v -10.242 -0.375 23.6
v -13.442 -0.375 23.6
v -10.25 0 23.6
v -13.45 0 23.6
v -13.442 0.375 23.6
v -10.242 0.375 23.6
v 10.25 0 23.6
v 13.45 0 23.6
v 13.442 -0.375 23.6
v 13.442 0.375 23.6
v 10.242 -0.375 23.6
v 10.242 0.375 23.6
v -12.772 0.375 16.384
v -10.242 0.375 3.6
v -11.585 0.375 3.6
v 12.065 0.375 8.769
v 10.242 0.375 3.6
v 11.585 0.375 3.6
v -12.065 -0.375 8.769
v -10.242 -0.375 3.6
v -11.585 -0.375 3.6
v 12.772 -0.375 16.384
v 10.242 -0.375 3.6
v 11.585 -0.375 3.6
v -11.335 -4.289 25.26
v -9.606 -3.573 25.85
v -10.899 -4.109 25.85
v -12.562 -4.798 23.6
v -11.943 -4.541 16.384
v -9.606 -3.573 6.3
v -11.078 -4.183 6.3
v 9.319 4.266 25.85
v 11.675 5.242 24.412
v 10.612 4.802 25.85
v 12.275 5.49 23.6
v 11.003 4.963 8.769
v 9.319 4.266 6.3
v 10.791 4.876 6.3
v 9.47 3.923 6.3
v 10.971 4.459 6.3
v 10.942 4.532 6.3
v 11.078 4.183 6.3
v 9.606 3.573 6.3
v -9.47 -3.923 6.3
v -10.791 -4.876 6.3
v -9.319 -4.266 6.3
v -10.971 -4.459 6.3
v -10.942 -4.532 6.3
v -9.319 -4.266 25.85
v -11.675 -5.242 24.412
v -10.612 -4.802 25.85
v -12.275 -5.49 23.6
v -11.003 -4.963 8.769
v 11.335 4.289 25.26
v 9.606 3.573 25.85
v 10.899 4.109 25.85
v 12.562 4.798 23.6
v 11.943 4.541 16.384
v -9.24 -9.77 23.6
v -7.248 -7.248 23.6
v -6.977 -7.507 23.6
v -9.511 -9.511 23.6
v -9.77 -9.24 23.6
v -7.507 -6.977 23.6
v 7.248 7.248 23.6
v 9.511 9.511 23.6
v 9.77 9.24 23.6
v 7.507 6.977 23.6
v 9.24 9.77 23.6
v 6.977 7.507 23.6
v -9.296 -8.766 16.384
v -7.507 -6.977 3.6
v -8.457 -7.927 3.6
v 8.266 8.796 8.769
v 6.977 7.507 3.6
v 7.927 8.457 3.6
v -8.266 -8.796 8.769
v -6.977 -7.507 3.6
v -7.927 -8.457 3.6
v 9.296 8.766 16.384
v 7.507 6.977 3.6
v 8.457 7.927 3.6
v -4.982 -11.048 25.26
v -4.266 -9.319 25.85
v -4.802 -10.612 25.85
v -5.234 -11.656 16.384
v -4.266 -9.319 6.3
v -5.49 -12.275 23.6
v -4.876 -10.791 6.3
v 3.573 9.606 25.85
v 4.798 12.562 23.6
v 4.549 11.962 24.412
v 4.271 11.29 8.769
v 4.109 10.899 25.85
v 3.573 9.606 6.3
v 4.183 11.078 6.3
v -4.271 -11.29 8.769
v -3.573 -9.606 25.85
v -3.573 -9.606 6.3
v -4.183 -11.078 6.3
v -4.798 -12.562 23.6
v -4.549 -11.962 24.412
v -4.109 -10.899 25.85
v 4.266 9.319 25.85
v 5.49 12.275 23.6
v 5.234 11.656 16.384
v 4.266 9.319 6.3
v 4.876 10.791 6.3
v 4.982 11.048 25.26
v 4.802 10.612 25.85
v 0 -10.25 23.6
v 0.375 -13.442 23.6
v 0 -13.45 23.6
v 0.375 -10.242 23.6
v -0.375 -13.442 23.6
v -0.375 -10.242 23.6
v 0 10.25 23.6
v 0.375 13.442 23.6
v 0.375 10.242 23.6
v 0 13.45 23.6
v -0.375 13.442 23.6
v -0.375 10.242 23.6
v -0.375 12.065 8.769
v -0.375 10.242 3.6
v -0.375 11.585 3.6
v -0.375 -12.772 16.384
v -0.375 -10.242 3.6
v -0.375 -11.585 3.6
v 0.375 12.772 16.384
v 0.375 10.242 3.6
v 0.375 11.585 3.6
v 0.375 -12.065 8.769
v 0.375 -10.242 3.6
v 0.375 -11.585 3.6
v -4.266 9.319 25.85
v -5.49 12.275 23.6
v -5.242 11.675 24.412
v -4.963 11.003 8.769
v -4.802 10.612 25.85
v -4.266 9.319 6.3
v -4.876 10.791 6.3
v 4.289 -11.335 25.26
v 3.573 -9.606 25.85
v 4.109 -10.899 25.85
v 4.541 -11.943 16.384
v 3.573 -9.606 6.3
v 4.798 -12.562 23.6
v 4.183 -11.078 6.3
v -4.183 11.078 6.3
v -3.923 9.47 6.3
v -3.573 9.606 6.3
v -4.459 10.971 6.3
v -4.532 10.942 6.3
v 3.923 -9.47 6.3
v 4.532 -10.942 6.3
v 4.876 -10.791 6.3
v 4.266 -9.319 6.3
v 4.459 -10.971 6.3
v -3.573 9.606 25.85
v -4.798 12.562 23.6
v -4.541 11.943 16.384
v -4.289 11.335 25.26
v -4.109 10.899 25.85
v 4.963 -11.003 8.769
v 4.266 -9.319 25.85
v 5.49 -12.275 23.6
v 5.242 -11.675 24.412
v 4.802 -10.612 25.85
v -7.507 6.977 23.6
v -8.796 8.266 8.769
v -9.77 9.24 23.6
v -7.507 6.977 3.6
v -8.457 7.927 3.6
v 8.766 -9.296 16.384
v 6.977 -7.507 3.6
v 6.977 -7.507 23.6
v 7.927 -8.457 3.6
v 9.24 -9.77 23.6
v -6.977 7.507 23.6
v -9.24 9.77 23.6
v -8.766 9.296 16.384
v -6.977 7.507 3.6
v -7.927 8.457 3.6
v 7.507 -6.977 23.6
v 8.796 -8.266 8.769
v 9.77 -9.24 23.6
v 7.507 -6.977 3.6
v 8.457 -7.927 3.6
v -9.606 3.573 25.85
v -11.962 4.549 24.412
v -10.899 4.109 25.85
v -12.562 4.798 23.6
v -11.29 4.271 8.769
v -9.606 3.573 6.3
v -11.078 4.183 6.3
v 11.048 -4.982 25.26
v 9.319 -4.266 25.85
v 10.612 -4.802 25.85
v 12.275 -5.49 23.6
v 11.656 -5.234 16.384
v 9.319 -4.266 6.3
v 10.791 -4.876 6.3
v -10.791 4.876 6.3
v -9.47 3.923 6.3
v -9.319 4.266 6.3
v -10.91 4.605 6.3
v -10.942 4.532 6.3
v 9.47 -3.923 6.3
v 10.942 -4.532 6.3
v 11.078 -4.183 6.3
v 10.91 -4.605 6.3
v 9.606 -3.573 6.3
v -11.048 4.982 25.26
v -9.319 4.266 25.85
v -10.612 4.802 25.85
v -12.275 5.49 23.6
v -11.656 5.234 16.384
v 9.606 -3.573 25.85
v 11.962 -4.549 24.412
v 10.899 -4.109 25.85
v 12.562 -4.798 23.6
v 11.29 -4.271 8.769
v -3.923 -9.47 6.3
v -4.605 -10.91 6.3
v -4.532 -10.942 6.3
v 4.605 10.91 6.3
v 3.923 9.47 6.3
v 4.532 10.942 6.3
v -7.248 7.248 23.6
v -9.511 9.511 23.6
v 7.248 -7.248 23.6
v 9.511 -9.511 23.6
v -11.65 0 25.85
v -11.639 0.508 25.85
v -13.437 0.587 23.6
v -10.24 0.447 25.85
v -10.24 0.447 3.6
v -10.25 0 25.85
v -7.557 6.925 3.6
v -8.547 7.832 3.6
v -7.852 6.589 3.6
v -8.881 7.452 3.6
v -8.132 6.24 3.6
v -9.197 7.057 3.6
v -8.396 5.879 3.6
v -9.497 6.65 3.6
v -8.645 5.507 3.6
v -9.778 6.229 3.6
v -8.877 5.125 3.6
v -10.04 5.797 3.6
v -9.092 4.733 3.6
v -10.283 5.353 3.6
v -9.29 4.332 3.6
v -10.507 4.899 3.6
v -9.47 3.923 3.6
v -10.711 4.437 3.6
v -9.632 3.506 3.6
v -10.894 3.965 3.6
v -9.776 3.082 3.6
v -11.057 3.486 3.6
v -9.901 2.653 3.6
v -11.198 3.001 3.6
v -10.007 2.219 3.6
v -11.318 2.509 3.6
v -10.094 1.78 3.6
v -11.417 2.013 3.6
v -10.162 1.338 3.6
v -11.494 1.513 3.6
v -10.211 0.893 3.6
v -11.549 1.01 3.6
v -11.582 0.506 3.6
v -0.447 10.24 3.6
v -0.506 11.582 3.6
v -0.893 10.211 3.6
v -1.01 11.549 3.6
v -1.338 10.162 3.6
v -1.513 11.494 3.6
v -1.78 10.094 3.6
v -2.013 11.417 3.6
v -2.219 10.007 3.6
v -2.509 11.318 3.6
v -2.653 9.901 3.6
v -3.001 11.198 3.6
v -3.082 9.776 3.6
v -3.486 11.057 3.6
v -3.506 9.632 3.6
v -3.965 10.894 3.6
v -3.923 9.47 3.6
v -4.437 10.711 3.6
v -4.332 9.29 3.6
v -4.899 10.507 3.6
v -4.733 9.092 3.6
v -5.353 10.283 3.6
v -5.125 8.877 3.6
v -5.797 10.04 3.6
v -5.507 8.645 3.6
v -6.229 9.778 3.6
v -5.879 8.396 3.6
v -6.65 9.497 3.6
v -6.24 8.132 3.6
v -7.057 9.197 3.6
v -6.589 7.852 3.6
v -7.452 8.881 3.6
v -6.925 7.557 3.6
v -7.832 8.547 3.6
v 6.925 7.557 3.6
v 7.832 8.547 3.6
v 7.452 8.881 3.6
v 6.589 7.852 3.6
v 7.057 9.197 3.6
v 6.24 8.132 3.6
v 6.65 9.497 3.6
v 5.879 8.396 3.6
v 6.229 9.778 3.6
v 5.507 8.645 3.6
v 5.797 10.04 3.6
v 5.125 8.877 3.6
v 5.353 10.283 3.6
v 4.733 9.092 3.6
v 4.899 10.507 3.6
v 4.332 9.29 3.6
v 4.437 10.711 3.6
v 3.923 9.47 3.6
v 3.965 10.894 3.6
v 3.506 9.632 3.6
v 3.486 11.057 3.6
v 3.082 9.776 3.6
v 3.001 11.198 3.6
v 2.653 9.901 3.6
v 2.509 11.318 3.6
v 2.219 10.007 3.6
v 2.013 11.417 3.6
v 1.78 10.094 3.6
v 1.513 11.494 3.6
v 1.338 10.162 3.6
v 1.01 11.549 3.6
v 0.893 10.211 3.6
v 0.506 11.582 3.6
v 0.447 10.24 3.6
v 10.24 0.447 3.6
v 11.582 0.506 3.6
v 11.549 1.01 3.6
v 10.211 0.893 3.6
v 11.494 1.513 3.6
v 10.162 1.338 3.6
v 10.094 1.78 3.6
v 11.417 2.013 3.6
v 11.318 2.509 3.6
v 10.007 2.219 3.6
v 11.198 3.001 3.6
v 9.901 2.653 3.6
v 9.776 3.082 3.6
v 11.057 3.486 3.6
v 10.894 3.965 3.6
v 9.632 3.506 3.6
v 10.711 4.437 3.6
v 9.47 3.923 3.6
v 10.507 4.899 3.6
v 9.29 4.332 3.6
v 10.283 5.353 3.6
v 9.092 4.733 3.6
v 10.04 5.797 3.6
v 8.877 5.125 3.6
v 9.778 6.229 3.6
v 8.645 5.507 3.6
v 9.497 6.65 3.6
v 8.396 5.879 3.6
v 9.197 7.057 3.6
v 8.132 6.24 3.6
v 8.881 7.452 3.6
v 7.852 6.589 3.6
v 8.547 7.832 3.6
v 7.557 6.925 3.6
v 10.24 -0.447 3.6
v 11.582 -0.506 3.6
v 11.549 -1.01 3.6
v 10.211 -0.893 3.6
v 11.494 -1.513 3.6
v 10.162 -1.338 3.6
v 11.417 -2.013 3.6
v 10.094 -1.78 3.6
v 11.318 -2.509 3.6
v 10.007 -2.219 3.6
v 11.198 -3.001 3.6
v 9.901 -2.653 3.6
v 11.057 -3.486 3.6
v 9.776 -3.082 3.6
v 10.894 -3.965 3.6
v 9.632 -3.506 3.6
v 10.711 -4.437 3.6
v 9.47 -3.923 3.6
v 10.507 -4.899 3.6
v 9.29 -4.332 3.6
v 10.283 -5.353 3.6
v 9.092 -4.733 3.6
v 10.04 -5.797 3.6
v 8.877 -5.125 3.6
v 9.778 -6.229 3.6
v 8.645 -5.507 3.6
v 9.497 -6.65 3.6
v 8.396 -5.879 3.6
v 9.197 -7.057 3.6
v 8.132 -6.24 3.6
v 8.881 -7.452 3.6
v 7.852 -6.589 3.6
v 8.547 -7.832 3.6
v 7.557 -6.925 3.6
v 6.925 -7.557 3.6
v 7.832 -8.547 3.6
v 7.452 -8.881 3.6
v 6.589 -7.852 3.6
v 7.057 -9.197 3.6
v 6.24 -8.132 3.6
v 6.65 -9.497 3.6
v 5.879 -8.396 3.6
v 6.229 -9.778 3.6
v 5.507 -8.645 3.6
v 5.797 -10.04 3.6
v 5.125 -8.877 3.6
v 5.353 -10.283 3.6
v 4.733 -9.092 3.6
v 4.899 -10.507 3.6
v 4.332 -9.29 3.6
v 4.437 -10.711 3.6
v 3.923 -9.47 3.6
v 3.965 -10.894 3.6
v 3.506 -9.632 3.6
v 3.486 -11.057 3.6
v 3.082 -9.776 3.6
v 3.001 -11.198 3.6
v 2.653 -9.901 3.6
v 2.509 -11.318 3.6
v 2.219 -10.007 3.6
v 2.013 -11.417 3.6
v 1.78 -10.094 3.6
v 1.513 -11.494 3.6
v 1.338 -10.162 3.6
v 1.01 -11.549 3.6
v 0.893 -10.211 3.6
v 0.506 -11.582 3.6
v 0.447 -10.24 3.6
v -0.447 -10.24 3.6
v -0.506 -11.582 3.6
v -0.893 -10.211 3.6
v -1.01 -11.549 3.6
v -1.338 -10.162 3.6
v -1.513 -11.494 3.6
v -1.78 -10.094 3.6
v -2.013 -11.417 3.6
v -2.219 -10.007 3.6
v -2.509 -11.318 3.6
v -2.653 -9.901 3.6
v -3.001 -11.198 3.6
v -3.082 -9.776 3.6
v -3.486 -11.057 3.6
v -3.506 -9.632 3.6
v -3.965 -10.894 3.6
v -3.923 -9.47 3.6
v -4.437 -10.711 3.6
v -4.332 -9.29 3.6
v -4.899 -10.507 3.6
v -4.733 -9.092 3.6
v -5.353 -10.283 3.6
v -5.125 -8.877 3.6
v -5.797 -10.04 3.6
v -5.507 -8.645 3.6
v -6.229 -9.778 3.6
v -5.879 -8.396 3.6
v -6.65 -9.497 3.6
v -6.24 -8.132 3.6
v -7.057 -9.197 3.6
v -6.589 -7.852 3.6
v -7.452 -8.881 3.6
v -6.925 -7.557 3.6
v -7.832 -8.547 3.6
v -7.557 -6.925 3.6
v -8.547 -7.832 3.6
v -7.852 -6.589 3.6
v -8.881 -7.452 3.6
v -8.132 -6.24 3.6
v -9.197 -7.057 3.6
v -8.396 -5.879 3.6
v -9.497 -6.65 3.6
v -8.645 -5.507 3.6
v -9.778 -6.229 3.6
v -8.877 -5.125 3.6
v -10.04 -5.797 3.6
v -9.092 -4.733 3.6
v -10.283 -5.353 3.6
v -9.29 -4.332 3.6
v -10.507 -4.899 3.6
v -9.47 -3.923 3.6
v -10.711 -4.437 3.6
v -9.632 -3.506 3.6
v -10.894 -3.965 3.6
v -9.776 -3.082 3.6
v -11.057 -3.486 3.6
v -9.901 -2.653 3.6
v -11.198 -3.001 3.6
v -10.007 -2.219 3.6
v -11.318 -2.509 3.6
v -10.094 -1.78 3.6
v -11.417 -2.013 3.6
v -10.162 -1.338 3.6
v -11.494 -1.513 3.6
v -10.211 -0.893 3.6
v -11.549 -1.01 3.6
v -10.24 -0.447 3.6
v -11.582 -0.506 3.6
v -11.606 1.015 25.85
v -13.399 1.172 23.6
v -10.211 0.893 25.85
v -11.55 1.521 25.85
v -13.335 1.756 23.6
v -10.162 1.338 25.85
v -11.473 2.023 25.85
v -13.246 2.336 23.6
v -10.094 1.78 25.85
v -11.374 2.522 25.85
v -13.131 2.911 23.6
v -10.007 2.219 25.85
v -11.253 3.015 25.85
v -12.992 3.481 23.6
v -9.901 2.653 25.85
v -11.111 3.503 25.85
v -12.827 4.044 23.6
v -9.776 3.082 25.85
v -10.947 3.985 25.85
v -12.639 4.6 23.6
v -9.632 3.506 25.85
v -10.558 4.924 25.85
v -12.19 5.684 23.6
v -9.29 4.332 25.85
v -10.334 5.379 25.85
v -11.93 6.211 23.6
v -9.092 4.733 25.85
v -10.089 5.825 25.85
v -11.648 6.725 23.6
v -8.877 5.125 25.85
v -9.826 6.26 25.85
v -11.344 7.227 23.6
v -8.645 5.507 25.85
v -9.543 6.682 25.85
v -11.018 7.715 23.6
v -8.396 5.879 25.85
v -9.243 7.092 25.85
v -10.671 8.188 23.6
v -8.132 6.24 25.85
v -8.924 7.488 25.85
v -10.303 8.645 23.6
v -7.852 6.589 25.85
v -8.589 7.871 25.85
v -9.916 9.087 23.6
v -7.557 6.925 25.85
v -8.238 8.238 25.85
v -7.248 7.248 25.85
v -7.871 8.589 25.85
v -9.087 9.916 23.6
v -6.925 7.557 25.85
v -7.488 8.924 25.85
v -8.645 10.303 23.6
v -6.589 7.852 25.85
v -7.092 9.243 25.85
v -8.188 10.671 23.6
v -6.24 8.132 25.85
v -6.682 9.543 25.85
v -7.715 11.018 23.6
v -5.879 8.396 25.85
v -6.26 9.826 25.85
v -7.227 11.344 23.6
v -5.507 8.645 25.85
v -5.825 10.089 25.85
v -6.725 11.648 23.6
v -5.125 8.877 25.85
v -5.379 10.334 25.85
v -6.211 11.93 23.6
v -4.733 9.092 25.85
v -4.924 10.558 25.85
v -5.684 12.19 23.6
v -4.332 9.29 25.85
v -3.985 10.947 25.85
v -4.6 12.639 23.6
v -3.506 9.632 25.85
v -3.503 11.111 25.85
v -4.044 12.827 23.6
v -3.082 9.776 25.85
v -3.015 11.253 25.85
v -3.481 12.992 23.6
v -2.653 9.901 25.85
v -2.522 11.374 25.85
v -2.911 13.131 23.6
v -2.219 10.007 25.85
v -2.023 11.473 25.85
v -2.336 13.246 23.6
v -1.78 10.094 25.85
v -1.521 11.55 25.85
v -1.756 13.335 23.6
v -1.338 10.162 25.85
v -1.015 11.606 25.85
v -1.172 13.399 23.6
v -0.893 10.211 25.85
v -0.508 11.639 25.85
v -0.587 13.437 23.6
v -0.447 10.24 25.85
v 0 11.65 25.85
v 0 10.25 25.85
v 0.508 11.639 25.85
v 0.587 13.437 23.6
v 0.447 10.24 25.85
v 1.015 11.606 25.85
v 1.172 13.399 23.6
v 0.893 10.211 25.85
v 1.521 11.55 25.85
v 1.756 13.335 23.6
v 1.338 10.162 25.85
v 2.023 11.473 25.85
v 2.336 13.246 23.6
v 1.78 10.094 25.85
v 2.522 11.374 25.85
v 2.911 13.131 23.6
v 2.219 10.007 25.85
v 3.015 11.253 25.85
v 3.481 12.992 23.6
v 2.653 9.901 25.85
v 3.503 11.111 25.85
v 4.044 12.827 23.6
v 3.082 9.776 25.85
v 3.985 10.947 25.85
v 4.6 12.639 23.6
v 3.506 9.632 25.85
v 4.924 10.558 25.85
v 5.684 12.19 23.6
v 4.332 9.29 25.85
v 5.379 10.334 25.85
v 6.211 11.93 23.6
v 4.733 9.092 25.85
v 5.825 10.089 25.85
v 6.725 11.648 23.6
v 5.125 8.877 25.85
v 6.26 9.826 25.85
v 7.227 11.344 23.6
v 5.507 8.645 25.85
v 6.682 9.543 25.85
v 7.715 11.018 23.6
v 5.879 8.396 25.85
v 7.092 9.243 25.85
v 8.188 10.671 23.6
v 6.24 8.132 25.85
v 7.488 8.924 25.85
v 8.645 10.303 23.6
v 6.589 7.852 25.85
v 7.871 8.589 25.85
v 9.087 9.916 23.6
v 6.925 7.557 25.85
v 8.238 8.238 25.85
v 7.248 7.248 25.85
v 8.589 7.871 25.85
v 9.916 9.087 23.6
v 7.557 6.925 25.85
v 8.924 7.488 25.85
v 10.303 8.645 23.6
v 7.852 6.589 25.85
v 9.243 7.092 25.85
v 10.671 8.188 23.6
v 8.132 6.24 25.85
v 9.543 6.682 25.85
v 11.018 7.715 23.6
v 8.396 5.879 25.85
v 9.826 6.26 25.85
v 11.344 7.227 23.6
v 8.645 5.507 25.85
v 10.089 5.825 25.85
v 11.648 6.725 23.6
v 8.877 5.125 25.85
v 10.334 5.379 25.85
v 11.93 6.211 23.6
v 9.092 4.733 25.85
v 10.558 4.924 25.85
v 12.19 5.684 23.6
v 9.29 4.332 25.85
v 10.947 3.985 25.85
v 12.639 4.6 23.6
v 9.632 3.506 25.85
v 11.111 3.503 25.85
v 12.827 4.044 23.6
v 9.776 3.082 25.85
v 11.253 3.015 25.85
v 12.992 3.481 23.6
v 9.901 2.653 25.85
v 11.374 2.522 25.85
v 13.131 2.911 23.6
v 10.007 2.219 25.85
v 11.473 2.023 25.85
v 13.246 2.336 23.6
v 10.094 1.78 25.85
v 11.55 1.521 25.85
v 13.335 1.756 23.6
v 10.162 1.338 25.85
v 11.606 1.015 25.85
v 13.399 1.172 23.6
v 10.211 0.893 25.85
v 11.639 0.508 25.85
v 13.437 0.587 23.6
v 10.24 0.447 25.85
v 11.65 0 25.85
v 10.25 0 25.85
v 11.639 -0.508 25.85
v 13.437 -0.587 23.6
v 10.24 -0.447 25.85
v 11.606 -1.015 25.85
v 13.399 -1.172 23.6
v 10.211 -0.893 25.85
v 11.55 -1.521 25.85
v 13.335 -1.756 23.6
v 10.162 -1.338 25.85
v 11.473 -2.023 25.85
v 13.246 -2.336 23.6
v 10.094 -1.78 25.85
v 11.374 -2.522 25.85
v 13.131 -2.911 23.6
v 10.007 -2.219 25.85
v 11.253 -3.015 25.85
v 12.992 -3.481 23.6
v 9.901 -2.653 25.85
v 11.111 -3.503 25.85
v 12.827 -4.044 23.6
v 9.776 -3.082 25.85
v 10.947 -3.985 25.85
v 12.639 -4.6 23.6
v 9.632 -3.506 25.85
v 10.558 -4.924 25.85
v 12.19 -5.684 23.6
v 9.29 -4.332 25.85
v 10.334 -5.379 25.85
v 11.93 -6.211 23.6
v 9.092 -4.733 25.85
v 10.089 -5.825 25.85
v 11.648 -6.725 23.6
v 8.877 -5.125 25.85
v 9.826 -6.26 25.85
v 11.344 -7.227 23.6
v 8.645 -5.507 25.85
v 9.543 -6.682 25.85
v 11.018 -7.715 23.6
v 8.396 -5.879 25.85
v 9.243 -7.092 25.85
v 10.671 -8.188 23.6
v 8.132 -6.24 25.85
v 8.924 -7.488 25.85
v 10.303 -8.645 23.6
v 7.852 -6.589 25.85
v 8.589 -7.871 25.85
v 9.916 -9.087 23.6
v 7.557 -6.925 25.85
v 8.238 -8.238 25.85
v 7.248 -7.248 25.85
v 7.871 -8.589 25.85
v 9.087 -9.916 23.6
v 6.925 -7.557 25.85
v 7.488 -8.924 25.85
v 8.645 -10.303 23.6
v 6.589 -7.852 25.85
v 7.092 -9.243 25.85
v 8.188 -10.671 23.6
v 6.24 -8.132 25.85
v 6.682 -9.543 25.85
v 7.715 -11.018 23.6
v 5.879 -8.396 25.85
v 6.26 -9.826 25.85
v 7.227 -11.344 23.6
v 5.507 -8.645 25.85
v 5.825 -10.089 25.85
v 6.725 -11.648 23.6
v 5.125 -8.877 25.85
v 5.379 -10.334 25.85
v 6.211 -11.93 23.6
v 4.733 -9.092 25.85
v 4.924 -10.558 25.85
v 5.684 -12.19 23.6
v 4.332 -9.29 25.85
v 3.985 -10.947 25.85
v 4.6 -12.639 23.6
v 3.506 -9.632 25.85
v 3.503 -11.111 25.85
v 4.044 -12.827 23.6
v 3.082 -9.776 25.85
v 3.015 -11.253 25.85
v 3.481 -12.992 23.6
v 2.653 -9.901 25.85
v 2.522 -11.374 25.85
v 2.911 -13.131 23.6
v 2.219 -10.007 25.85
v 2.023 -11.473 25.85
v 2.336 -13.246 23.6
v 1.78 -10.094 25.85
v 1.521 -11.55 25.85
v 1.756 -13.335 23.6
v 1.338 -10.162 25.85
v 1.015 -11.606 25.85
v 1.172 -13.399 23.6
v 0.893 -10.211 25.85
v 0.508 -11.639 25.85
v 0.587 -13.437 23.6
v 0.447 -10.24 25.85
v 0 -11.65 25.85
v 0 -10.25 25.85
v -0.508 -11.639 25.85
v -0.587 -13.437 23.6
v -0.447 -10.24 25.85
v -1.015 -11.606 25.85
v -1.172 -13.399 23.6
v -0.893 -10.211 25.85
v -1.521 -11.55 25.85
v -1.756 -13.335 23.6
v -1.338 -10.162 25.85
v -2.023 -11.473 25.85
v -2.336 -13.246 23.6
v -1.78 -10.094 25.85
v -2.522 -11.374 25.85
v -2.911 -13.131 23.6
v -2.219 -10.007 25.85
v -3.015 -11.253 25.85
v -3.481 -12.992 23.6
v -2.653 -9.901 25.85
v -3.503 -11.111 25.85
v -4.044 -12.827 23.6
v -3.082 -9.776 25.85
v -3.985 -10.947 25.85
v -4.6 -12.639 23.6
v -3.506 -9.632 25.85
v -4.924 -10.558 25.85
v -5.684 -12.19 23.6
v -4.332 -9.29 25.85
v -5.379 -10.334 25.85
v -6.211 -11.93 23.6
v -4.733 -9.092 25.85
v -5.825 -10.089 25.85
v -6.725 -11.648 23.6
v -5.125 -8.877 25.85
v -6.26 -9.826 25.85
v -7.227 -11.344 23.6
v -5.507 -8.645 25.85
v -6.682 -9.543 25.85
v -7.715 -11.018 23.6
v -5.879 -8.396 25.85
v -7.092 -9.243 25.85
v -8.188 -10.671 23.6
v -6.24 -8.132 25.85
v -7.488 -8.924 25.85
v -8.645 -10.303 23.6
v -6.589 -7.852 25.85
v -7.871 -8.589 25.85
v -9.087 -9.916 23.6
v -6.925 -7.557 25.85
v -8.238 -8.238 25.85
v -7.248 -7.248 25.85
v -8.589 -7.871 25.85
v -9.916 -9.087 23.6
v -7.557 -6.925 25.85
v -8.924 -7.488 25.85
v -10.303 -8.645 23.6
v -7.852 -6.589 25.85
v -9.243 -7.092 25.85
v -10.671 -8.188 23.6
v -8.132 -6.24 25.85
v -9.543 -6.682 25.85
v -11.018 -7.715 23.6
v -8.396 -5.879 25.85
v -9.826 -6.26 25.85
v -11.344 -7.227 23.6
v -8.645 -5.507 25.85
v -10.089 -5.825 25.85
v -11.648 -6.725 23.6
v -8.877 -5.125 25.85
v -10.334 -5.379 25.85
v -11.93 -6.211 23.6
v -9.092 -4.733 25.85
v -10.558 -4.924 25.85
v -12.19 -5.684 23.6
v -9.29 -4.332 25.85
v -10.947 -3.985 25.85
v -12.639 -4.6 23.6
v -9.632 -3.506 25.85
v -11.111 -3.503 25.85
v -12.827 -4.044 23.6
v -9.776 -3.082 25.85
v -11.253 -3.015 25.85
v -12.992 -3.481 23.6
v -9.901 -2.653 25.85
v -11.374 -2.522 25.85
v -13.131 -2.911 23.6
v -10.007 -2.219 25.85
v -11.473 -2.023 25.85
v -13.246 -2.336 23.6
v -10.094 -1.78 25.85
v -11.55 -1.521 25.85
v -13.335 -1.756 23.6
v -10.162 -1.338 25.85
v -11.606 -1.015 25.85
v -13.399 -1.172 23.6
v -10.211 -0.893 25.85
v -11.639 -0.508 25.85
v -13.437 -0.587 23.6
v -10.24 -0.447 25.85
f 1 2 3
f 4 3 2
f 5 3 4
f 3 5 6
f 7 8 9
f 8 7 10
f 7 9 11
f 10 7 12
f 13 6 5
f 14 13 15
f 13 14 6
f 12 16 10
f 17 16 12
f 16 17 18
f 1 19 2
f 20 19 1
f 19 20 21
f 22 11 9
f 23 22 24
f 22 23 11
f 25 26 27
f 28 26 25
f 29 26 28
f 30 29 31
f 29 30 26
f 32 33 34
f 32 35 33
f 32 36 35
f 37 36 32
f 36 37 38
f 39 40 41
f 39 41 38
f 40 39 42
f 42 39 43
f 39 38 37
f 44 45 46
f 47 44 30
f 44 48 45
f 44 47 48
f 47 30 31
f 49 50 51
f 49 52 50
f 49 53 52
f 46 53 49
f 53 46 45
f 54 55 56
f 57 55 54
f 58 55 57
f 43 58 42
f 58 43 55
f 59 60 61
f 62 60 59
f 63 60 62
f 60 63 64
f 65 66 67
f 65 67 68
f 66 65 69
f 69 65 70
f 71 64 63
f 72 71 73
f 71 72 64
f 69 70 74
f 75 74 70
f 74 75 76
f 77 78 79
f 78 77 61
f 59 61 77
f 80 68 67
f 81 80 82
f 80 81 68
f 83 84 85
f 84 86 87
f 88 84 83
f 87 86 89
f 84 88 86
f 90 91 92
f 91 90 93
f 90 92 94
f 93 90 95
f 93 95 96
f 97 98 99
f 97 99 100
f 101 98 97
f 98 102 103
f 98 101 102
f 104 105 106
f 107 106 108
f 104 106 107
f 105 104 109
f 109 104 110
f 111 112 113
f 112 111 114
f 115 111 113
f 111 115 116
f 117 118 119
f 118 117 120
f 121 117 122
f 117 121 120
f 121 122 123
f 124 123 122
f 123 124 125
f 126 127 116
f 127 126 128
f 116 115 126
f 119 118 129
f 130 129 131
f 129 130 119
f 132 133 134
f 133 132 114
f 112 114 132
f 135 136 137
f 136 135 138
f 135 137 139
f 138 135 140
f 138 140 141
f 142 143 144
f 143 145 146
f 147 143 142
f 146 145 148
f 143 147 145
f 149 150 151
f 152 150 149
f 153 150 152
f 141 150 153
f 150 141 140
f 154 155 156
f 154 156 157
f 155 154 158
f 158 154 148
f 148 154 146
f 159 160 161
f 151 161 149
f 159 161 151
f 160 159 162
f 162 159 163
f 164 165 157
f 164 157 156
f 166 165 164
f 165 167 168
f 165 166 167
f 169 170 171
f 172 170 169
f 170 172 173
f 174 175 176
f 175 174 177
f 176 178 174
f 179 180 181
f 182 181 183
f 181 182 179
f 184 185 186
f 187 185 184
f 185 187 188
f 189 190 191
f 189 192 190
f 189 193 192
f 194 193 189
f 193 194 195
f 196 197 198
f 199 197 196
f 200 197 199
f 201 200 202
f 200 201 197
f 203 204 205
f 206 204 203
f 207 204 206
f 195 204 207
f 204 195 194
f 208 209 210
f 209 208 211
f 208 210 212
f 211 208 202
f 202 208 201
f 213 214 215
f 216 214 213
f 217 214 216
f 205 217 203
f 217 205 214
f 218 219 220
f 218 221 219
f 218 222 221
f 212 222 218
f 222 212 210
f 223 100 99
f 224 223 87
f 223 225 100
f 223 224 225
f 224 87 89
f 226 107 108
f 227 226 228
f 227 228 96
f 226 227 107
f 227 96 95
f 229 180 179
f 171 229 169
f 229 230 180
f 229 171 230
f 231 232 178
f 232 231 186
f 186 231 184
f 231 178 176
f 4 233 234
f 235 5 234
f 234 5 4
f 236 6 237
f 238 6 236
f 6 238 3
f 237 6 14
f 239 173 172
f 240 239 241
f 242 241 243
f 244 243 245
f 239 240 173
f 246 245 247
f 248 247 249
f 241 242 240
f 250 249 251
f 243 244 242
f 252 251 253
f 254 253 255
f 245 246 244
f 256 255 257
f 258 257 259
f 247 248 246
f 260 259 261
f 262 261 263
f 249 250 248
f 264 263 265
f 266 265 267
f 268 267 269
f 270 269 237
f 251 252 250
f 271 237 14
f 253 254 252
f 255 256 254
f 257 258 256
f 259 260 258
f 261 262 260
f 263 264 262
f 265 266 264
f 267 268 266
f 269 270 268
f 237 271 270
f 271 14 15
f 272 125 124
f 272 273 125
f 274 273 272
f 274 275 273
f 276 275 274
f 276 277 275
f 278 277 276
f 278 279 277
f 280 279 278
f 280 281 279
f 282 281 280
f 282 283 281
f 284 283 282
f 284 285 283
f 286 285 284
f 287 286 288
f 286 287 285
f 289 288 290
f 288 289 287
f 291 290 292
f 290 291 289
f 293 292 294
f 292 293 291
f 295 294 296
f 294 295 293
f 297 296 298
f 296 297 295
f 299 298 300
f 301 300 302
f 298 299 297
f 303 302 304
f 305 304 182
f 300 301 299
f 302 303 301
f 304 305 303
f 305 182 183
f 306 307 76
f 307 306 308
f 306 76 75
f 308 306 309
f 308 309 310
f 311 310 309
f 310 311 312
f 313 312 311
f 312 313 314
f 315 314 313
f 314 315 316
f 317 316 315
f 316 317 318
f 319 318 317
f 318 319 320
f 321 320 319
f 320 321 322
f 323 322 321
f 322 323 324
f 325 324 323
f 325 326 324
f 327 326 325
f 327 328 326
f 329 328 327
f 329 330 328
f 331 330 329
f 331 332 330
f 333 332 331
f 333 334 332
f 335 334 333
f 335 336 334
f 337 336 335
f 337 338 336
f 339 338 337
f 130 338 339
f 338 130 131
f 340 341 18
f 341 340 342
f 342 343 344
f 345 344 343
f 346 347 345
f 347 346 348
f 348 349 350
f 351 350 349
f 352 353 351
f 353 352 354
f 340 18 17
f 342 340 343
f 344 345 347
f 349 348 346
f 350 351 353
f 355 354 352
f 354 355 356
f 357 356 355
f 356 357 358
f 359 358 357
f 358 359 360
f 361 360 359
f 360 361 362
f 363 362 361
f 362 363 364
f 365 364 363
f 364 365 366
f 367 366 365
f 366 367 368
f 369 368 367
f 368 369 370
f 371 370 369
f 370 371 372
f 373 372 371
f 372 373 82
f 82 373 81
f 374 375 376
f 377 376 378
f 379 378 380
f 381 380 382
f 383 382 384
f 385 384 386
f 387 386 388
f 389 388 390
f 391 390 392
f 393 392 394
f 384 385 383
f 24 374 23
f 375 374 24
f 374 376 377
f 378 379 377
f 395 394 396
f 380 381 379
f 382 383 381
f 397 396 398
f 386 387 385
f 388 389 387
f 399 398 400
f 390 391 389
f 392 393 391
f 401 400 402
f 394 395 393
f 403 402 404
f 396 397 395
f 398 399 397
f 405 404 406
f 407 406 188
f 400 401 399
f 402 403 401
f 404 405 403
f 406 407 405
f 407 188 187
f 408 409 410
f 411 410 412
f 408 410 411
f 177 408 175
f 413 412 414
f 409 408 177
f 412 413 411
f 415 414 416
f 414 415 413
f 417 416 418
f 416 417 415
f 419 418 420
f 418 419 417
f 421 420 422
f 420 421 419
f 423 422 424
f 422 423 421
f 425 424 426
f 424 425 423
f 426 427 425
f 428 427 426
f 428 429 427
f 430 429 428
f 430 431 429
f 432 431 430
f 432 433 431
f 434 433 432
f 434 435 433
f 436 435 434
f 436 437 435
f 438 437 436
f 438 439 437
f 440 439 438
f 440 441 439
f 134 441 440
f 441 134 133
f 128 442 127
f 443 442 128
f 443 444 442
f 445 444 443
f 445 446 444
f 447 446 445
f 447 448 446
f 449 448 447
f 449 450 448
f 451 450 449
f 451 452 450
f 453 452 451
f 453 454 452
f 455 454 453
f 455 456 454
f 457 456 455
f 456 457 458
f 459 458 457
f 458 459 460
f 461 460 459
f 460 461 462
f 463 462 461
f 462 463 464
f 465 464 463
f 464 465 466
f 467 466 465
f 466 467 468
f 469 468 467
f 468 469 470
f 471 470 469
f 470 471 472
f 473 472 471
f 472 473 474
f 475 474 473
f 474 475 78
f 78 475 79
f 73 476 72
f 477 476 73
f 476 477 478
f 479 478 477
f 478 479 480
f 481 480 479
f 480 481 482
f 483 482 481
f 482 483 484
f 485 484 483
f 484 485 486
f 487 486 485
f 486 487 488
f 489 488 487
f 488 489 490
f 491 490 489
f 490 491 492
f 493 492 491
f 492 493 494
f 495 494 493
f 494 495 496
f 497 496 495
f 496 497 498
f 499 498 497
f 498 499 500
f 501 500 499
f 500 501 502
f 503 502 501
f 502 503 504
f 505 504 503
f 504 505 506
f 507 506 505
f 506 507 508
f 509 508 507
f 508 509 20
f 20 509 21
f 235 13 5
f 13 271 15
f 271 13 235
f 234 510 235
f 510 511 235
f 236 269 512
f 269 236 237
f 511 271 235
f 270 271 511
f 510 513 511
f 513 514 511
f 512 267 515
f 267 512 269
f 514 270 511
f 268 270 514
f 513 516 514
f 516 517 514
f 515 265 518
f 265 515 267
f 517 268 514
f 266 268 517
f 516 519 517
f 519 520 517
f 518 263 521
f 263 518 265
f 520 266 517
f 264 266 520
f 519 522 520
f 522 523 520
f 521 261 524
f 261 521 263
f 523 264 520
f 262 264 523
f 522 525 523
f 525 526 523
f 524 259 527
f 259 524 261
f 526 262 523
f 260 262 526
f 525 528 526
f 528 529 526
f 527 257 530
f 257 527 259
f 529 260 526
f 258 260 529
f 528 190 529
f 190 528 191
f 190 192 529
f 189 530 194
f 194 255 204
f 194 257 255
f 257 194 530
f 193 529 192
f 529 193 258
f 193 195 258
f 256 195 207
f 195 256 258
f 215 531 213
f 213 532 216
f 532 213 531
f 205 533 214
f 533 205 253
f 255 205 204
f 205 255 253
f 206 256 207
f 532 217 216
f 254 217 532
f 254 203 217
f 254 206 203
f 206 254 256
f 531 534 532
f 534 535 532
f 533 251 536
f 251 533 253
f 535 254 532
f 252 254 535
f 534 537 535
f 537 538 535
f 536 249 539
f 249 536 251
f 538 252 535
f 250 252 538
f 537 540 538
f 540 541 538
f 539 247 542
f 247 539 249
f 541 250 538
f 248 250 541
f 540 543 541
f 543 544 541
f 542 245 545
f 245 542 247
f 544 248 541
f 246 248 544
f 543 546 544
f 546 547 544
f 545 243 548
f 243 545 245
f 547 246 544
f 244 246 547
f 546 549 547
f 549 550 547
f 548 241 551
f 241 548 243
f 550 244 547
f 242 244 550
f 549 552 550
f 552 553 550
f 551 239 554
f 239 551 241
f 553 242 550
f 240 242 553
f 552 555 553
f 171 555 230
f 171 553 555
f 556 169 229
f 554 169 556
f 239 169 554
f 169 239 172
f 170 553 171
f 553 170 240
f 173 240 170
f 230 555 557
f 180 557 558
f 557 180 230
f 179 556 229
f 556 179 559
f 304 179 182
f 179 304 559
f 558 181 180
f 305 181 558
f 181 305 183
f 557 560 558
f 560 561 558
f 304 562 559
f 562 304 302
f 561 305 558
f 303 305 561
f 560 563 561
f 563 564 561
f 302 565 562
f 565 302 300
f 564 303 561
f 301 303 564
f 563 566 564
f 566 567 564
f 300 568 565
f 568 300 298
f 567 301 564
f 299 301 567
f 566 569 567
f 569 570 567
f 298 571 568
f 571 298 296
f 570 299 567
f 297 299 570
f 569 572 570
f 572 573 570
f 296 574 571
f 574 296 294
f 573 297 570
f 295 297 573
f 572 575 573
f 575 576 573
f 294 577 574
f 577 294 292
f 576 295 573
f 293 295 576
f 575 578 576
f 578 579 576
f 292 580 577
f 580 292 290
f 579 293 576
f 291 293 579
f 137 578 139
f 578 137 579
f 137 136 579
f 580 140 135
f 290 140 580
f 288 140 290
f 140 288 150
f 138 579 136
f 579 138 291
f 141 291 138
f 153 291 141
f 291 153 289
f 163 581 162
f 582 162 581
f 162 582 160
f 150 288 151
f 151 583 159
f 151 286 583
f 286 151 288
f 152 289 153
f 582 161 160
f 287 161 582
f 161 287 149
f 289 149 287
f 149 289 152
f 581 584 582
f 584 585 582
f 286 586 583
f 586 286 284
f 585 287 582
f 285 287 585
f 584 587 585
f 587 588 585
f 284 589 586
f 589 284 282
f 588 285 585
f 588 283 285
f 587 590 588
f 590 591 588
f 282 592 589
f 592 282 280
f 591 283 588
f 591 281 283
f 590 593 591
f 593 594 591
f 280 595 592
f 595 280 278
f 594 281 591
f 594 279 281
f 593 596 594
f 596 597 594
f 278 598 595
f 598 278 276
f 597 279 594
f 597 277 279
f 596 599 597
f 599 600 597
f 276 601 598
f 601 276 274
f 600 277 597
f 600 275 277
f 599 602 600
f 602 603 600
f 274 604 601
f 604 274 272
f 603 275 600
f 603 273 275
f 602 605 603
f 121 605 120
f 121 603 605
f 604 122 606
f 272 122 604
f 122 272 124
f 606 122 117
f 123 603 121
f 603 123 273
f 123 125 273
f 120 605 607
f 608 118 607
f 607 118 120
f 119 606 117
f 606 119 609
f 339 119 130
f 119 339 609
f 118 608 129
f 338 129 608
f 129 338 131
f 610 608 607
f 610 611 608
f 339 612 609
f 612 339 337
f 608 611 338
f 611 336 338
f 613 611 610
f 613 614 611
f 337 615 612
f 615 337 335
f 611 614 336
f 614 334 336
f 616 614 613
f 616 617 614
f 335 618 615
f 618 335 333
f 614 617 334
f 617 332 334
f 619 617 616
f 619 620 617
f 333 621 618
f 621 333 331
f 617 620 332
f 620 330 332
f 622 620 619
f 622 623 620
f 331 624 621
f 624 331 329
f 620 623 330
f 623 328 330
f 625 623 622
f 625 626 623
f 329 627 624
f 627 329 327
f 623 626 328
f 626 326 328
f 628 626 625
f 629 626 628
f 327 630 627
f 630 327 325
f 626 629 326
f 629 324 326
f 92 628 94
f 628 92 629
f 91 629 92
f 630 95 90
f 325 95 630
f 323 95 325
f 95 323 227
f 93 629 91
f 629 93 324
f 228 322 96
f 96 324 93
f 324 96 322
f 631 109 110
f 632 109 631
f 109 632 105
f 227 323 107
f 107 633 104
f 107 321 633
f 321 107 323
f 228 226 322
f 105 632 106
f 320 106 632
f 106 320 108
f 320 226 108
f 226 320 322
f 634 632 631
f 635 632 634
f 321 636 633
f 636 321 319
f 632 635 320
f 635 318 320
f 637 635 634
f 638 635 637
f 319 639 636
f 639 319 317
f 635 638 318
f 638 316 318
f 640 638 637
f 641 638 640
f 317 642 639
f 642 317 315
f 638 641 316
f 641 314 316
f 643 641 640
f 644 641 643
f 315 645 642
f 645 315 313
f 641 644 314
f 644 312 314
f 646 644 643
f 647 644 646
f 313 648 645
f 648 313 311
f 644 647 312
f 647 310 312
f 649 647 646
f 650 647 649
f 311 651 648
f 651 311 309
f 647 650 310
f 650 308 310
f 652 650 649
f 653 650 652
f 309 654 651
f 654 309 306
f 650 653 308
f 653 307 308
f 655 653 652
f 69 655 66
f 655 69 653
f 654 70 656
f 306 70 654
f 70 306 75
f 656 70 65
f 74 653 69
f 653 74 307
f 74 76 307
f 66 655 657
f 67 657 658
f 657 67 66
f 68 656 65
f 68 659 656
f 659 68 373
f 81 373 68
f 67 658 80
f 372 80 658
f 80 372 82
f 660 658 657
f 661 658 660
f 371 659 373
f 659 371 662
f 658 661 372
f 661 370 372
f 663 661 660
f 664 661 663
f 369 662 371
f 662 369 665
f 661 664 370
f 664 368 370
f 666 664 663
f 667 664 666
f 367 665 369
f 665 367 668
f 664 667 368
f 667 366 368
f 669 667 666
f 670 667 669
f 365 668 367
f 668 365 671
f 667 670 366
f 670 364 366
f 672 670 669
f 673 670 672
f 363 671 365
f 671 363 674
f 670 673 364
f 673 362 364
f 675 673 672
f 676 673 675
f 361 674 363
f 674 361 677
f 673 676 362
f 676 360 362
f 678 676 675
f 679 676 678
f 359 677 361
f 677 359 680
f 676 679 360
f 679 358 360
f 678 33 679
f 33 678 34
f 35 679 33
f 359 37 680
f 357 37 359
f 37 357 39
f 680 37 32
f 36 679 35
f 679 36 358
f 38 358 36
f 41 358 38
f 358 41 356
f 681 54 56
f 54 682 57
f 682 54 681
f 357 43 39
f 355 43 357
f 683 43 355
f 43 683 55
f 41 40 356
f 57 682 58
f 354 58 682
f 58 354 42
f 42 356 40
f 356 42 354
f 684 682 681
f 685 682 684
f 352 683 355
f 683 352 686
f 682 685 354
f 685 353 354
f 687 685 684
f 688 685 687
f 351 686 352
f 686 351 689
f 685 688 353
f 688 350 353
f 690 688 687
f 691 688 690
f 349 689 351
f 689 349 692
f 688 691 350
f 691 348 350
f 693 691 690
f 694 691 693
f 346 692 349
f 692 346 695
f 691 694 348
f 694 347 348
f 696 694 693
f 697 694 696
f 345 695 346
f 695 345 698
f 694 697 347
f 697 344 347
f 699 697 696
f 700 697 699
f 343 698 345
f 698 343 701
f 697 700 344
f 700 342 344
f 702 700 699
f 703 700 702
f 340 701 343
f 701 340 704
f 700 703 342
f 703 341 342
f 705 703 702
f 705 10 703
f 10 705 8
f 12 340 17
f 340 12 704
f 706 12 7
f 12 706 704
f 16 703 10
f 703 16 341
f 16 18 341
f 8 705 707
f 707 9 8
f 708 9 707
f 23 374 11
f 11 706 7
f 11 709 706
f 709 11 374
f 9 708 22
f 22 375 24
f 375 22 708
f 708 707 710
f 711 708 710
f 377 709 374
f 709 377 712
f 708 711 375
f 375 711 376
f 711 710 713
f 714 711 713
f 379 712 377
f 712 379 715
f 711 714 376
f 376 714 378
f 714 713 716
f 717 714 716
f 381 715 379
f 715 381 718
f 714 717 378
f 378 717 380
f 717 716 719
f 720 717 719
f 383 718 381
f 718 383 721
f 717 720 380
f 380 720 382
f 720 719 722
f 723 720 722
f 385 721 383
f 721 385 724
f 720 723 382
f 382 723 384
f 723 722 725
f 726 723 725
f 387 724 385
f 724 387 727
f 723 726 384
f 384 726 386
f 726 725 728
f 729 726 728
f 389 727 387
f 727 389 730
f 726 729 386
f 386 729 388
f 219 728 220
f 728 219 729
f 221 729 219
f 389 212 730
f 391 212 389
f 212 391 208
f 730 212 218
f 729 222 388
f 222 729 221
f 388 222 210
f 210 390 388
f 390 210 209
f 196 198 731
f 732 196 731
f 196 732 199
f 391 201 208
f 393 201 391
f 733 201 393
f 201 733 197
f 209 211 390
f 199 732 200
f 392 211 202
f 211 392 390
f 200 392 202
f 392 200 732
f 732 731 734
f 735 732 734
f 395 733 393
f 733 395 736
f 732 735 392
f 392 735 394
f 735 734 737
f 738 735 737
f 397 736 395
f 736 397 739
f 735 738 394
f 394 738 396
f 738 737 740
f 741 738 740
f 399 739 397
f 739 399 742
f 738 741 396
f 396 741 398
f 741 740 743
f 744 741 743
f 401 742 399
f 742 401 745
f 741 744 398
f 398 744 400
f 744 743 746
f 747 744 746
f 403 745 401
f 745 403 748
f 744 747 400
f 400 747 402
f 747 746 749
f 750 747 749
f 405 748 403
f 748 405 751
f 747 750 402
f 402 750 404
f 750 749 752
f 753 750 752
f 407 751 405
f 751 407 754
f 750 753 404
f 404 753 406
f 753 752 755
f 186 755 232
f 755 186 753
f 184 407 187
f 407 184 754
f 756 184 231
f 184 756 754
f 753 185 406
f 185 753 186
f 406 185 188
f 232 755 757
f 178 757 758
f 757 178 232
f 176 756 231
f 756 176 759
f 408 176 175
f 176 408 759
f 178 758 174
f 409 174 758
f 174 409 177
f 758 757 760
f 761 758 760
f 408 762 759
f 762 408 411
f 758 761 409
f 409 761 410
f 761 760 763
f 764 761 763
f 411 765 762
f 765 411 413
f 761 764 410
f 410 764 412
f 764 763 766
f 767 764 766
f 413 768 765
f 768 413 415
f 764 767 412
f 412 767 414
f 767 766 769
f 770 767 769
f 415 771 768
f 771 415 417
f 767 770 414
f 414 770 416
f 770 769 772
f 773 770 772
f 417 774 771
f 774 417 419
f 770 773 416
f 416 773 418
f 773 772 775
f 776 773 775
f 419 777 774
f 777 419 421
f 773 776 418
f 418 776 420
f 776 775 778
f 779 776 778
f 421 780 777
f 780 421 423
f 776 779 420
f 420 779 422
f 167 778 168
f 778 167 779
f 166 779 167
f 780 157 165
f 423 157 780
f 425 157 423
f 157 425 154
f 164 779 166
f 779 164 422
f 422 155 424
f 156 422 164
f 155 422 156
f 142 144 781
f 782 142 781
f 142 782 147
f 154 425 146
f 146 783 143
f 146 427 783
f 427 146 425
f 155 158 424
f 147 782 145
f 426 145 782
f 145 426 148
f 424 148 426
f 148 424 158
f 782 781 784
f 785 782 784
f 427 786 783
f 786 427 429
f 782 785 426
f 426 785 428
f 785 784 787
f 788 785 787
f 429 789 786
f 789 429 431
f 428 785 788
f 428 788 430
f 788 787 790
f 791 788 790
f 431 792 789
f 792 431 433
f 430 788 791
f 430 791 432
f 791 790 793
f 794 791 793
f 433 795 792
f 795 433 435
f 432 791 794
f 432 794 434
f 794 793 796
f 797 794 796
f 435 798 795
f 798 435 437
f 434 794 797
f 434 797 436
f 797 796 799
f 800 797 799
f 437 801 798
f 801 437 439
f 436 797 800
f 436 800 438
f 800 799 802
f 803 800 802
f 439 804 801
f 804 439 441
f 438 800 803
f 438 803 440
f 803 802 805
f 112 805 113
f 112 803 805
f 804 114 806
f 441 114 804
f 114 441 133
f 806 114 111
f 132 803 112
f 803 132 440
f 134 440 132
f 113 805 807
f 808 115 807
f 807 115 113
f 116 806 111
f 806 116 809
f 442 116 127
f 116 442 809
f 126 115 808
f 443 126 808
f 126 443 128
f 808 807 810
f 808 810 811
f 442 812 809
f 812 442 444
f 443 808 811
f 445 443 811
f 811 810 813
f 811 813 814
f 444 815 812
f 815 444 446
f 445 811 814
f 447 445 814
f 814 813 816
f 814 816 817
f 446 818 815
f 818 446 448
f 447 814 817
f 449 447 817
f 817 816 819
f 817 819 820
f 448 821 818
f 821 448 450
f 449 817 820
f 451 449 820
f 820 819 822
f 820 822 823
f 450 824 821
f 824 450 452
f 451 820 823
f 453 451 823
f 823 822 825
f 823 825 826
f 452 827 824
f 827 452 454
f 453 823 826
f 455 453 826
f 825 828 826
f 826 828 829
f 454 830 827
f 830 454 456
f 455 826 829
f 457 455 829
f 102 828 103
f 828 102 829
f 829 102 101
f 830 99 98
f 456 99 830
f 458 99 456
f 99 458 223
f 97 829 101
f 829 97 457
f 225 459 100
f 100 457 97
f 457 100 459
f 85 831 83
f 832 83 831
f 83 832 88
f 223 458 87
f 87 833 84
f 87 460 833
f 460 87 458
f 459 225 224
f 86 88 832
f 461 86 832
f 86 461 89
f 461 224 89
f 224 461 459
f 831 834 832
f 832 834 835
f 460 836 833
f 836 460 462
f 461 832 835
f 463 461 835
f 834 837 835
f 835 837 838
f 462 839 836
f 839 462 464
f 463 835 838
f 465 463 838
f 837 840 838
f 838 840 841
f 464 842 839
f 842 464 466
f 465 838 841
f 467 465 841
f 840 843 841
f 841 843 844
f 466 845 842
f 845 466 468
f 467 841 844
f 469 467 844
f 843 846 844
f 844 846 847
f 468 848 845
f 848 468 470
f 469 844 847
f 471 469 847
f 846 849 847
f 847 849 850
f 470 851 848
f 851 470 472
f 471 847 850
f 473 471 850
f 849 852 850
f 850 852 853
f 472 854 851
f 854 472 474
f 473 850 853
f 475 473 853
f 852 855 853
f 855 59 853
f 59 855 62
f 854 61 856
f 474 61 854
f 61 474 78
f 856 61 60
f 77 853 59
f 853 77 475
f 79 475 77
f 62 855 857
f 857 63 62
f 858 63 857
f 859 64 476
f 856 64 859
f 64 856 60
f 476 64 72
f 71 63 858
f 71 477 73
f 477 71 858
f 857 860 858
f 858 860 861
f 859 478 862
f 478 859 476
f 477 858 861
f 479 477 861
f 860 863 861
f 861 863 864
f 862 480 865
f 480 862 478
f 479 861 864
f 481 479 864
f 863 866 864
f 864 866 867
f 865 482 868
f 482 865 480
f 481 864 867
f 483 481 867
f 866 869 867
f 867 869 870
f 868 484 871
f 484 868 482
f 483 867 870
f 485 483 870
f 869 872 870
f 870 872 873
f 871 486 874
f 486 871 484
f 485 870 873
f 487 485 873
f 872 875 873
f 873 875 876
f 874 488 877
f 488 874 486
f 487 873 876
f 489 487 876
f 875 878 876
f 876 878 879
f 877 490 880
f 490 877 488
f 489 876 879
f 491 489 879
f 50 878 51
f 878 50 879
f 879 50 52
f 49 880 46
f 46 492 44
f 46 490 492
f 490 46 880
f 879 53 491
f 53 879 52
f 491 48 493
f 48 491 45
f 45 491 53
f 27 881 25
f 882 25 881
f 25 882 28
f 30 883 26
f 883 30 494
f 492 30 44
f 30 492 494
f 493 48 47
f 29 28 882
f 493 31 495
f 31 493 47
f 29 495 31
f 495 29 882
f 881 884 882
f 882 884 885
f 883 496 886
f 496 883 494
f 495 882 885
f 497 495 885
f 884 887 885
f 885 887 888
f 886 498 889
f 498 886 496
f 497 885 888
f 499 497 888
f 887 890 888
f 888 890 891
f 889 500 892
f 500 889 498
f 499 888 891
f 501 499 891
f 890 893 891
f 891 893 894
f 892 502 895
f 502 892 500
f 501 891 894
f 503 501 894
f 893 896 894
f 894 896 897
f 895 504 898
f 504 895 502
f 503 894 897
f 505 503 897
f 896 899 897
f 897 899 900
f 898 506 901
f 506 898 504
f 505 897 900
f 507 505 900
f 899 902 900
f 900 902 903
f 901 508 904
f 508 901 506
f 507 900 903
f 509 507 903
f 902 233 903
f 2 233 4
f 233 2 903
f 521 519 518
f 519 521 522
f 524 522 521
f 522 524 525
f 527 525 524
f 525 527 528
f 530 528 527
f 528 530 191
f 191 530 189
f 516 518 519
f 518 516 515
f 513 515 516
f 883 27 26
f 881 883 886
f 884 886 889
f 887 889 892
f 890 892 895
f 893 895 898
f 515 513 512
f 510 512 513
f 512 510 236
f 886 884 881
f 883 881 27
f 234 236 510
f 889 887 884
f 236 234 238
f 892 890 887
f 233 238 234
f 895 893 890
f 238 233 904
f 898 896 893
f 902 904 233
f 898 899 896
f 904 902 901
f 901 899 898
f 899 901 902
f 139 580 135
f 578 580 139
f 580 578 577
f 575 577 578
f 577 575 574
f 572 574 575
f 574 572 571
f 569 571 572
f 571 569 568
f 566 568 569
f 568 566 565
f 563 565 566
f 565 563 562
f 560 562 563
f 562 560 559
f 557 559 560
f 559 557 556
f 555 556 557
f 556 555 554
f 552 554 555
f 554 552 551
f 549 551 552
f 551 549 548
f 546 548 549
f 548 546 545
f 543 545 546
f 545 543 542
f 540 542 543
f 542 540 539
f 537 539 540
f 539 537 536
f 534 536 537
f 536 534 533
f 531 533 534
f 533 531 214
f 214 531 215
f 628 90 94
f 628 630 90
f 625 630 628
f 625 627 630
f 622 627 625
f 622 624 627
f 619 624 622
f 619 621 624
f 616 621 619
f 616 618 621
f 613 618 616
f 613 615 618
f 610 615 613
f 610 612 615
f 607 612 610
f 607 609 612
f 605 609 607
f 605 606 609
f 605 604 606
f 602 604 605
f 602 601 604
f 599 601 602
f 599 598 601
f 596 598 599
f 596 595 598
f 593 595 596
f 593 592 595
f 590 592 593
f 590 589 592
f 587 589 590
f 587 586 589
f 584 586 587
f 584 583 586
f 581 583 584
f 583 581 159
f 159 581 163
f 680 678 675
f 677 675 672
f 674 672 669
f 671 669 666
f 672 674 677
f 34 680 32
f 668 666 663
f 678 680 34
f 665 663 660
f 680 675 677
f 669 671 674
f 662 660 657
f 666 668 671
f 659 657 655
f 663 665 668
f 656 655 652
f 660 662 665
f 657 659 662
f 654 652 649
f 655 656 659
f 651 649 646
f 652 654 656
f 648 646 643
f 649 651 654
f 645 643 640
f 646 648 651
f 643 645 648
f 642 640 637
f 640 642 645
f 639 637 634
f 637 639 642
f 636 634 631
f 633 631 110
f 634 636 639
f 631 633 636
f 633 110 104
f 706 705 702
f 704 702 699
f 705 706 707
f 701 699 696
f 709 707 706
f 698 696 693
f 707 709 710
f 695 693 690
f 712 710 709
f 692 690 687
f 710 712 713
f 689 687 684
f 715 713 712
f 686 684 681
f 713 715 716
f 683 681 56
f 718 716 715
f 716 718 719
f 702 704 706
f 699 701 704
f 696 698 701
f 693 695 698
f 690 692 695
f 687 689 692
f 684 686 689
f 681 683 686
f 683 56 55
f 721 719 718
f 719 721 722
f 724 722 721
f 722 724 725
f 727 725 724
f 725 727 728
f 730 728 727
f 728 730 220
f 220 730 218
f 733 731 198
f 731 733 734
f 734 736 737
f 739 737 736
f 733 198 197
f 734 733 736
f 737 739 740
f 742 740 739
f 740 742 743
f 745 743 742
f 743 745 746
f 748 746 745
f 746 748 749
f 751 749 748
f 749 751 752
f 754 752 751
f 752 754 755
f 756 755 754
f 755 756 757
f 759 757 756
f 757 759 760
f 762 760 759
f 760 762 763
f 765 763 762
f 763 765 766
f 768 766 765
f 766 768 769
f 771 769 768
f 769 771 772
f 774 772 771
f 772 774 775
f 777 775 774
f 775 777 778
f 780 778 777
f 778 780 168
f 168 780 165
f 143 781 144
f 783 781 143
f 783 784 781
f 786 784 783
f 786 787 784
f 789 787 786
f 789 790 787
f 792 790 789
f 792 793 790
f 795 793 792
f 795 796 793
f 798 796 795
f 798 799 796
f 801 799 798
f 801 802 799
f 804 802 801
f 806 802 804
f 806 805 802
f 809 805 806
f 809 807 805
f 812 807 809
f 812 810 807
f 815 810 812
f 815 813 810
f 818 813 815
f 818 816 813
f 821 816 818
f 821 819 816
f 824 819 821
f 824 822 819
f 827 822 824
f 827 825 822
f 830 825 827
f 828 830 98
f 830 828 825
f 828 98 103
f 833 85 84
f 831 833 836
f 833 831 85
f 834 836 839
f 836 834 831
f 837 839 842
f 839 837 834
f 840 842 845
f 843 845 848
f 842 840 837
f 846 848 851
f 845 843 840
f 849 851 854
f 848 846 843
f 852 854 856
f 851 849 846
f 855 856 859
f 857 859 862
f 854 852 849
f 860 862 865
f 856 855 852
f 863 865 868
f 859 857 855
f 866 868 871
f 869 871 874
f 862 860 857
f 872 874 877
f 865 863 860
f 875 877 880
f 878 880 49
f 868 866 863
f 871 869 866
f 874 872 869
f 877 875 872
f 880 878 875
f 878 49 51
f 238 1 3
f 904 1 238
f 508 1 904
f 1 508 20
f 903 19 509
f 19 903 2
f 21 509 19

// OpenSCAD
include <FullAssembly.scad>
/* [Hidden] */
isStandalone=false;

ColletClamp(sec_poledia, $sec_wall, pole_colletpitch, pole_colletlength, 5);
